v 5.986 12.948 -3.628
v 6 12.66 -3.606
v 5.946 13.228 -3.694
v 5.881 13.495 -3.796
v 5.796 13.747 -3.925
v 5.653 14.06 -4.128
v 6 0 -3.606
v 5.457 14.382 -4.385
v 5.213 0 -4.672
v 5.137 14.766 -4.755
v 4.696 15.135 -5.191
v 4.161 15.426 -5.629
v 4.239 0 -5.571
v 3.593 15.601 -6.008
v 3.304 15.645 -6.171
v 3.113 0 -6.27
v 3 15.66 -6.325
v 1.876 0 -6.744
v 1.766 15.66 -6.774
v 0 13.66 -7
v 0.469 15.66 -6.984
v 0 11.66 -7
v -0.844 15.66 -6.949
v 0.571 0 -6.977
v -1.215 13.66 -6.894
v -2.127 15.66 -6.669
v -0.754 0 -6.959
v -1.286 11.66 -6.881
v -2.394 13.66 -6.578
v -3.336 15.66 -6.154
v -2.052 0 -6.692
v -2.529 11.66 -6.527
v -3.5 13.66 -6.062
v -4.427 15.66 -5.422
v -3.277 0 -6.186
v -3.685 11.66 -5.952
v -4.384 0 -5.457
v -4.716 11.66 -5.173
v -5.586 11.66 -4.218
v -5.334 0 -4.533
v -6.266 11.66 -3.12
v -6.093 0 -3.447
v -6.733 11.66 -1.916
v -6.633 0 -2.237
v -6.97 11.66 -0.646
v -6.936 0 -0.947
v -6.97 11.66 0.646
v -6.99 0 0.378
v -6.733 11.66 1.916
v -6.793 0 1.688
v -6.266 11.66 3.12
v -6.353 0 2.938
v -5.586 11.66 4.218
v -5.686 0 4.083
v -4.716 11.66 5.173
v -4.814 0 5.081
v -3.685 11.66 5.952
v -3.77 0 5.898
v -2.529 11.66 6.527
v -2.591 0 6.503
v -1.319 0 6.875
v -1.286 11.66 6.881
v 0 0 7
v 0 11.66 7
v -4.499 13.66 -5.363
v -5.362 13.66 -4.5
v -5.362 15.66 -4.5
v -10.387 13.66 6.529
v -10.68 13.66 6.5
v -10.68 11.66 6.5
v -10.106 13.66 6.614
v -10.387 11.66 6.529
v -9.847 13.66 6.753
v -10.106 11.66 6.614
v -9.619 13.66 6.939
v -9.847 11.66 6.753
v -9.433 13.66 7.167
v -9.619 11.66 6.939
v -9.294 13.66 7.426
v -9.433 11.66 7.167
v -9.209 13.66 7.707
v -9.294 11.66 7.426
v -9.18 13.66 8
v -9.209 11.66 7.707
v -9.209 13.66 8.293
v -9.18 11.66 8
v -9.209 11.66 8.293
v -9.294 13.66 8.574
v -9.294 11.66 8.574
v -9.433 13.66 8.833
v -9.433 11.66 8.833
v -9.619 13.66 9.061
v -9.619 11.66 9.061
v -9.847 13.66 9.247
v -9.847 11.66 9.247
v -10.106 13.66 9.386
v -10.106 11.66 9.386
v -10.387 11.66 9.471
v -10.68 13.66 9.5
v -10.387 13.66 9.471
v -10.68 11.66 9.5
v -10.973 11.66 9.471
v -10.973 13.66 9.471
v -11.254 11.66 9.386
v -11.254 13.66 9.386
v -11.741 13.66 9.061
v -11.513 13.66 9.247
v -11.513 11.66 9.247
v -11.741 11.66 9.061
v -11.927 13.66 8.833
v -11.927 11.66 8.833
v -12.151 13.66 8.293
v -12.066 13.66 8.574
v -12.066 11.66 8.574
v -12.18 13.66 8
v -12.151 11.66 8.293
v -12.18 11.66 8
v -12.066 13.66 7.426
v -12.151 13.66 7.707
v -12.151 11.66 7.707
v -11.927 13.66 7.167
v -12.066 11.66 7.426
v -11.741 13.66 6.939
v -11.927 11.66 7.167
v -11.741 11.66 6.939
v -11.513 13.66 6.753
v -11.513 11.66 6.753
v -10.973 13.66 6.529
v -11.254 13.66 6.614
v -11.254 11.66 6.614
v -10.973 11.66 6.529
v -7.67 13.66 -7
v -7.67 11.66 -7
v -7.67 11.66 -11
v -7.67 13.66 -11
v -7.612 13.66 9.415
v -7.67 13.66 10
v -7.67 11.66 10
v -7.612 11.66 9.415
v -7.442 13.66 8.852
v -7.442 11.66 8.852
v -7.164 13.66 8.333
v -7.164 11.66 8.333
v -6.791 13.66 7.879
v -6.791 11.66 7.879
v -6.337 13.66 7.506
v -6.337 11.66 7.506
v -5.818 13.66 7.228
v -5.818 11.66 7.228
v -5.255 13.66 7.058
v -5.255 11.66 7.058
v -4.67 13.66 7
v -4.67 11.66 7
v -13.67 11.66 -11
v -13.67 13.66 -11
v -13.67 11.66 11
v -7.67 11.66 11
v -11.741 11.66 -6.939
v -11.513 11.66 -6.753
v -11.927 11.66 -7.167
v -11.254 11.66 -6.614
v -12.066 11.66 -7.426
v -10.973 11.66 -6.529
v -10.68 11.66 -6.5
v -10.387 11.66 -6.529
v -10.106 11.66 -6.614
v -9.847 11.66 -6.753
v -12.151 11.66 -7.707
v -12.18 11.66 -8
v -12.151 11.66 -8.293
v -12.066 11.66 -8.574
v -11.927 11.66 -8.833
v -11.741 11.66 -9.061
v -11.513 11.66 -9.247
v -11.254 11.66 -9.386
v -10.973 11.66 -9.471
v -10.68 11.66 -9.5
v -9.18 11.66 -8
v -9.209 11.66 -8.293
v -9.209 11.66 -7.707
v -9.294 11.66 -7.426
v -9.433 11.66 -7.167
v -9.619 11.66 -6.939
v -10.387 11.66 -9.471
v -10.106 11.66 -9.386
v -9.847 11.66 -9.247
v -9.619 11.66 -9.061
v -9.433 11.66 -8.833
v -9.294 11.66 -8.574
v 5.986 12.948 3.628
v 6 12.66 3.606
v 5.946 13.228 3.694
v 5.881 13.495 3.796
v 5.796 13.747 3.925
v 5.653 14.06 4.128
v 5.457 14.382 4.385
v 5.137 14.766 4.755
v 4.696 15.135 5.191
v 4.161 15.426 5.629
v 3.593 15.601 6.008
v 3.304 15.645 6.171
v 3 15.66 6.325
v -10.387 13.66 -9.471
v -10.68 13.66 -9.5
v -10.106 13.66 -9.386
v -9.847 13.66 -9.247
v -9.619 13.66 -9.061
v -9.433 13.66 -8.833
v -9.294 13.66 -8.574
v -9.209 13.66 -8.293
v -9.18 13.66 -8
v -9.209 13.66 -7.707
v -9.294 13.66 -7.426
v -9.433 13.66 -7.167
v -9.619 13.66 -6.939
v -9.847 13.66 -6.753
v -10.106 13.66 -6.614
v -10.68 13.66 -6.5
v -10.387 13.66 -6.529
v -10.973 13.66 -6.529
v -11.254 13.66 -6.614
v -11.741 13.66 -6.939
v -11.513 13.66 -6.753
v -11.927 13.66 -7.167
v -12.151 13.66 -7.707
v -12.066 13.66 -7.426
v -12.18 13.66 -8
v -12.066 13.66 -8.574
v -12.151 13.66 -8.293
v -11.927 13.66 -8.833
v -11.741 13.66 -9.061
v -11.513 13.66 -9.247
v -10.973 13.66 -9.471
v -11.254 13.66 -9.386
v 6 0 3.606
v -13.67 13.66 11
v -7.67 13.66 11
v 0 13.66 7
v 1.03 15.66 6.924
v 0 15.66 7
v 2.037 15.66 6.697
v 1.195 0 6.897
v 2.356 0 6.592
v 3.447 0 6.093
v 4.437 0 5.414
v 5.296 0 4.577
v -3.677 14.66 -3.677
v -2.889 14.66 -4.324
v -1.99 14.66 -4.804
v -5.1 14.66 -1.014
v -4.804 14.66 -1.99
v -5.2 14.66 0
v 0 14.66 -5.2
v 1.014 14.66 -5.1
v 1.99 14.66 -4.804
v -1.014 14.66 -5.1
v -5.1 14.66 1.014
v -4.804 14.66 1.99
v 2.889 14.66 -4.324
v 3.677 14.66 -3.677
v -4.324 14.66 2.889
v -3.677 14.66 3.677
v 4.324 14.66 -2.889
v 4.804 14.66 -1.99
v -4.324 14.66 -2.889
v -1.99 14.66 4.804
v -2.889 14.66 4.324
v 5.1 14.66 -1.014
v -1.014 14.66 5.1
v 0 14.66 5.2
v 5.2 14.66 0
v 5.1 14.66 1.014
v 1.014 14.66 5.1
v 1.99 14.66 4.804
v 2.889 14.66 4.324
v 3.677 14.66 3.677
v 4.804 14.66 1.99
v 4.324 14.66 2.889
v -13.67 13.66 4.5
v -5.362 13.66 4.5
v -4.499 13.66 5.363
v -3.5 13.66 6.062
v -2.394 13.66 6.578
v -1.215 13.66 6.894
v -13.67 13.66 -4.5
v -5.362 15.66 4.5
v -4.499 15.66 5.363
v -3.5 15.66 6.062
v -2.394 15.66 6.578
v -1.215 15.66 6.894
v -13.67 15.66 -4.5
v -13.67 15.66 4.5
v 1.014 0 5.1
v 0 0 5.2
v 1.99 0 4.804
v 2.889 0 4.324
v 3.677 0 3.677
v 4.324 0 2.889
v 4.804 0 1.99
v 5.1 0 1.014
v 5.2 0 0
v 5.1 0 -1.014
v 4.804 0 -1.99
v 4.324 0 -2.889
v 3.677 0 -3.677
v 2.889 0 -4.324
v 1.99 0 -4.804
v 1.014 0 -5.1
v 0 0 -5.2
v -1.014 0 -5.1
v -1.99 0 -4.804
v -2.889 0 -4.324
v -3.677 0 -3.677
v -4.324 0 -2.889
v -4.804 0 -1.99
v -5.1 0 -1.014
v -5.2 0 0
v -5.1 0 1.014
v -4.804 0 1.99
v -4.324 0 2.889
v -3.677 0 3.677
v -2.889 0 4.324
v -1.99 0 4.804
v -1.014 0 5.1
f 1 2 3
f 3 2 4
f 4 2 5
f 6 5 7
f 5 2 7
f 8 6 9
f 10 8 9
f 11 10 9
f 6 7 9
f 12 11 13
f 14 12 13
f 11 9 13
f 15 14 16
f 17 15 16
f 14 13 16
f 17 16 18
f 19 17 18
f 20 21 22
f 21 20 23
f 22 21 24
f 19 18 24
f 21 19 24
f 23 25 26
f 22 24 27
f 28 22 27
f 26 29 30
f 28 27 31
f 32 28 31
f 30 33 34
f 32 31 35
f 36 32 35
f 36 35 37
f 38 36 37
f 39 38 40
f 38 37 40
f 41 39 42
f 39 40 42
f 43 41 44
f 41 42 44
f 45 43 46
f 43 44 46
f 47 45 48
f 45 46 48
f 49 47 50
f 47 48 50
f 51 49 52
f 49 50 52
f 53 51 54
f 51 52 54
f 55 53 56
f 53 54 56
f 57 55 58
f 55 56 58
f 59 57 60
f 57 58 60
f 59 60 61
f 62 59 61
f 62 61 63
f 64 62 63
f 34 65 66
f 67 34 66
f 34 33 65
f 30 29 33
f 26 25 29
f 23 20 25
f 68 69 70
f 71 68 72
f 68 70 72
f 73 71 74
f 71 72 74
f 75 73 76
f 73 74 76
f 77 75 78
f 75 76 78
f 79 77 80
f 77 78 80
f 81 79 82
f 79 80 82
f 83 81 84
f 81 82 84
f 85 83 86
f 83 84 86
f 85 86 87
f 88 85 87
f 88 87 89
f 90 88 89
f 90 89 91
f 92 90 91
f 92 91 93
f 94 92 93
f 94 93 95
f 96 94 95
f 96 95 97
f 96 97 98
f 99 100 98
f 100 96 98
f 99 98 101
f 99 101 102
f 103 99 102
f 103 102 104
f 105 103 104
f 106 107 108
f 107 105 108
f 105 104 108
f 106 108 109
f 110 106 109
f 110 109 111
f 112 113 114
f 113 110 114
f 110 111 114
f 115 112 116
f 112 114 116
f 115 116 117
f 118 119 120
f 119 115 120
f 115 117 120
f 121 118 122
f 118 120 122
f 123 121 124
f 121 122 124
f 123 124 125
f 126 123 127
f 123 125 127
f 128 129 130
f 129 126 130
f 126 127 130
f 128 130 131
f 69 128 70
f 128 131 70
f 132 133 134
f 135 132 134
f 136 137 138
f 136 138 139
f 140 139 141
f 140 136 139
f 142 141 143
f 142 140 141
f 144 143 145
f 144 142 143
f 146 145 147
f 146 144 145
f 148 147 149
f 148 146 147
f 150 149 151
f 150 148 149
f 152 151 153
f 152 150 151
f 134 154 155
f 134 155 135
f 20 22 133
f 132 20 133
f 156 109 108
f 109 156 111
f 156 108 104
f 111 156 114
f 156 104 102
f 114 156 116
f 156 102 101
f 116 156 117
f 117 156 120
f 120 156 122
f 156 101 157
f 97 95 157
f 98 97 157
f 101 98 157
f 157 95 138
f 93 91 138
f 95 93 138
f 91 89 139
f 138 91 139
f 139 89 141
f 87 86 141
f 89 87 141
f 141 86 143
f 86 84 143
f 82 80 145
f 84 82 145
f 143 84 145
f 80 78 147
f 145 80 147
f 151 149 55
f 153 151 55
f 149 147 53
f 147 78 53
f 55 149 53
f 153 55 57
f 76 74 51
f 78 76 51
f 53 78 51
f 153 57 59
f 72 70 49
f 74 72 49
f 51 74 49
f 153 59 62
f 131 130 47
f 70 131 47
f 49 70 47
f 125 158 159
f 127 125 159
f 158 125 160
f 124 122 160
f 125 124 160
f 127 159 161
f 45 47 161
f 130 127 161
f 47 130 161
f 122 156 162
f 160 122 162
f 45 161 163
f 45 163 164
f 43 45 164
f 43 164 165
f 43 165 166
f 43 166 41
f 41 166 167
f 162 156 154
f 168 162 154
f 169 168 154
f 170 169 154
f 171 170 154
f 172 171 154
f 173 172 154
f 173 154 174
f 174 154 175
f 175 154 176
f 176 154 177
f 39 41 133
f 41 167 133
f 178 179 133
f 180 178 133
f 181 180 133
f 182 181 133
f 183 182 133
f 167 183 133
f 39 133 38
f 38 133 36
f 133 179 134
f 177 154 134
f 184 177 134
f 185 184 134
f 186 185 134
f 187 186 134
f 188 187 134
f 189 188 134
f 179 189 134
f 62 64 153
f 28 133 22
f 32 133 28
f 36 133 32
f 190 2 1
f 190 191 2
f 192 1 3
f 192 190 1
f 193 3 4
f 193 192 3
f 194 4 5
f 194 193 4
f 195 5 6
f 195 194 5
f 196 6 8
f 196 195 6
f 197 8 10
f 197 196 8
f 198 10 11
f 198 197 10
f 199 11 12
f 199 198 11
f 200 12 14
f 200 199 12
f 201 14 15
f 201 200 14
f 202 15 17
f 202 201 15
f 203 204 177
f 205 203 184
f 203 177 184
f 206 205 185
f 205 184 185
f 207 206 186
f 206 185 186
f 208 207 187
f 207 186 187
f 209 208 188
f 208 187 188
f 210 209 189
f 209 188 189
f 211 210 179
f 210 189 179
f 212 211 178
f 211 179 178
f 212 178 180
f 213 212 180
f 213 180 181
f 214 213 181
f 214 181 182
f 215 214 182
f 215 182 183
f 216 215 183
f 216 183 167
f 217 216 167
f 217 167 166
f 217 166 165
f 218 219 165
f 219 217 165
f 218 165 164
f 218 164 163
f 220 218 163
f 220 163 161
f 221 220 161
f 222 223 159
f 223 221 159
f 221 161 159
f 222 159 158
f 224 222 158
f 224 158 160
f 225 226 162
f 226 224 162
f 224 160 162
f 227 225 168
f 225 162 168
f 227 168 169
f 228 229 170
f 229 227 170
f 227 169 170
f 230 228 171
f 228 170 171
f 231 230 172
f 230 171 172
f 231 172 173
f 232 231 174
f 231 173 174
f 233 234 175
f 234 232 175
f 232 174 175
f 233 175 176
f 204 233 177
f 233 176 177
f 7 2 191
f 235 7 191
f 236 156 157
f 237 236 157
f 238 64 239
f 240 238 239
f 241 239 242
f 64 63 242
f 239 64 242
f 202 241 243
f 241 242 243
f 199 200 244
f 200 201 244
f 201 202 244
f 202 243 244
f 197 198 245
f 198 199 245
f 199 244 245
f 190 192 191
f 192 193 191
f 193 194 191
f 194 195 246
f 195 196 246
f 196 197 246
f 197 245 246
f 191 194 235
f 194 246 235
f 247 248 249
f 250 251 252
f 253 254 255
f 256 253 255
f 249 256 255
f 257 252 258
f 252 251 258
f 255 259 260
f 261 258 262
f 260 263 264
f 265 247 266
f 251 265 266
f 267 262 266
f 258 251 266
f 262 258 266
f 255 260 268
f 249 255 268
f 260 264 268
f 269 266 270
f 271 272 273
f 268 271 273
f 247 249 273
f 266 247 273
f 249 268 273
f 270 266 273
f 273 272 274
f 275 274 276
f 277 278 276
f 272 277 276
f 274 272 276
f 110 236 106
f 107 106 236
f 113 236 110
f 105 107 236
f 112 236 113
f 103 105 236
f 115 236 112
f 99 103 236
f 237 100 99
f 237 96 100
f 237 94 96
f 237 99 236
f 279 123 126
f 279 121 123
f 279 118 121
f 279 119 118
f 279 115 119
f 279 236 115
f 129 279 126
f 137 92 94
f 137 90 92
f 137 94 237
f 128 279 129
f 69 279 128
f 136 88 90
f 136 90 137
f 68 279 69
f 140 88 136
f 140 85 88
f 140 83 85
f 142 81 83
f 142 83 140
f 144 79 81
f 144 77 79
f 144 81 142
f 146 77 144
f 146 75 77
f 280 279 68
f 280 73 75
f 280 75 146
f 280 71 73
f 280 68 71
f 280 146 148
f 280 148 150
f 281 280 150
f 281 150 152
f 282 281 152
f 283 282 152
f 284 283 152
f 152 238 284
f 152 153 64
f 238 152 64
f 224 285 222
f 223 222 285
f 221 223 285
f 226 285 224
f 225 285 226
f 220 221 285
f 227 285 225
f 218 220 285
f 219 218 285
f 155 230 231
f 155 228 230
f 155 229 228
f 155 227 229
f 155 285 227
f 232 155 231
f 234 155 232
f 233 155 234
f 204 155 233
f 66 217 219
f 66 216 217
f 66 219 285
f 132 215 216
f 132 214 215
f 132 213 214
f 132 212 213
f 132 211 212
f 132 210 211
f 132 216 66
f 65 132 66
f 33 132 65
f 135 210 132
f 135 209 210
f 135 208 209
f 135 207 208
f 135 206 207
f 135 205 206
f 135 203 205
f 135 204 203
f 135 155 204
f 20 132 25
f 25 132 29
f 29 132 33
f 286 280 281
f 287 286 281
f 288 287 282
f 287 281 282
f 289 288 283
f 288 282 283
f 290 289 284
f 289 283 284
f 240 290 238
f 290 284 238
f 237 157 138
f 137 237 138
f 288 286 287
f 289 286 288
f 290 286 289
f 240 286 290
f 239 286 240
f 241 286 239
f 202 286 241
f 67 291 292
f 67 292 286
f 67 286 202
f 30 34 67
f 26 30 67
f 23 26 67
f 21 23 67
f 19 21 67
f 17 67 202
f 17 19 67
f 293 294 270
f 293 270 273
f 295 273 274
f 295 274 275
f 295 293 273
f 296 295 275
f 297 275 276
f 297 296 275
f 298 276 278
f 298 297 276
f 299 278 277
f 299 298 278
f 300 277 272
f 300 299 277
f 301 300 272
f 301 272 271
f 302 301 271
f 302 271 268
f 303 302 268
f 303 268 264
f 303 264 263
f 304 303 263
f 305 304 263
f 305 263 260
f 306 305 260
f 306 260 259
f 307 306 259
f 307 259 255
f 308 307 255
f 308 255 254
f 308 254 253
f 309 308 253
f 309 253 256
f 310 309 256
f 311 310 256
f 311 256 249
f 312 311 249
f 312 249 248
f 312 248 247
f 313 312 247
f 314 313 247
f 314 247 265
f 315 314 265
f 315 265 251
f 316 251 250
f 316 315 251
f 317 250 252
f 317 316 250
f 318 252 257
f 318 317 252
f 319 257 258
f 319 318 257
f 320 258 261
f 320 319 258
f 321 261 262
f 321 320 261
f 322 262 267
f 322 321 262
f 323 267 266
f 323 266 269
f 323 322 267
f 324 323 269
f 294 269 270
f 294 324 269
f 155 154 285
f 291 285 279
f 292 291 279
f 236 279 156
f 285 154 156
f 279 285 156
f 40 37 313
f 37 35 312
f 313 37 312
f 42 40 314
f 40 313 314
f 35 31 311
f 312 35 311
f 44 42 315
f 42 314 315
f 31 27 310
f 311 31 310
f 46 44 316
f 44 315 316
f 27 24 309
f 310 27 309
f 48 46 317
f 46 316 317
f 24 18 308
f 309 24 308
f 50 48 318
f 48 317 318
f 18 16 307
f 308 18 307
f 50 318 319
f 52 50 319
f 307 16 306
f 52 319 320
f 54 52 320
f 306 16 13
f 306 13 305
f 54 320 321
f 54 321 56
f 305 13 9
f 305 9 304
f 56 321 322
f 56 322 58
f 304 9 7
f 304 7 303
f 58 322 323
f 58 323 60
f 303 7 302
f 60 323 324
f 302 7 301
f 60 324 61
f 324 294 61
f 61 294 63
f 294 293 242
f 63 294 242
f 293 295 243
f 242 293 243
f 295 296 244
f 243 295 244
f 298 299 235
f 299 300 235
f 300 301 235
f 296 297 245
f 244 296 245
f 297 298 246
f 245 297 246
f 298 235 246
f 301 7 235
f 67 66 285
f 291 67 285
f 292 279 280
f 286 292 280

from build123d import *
from build123d.topology import SkipClean

# Parameters (mm, degrees)
SKETCH1_R           = 7
SKETCH1_R_2         = 5.2
BOSS_EXTRUDE1_DEPTH = 15.66
BOSS_EXTRUDE2_START = -4
SKETCH2_W           = 6
SKETCH2_H           = 4
BOSS_EXTRUDE2_DEPTH = 4
CUT_EXTRUDE2_START  = -2
SKETCH2_3_W         = 6
SKETCH2_3_H         = 4
CUT_EXTRUDE2_DEPTH  = 2
SKETCH4_R           = 1.5
CUT_EXTRUDE1_DEPTH  = 10
FILLET7_R           = 3
BOSS_EXTRUDE3_START = -1
SKETCH5_R           = 5.2
BOSS_EXTRUDE3_DEPTH = 1
CUT_EXTRUDE3_DEPTH  = 15.66
FILLET8_R           = 3
BOSS_EXTRUDE4_DEPTH = 2


with BuildPart() as part:
    # Sketch1 → Boss-Extrude1 (new body)
    with BuildSketch(Plane(origin=(0, 0, 0), x_dir=(1, 0, 0), z_dir=(0, 1, 0))):
        with Locations(Location((0, 0, 0), (0, 0, 270))):
            Circle(SKETCH1_R)
        with Locations(Location((0, 0, 0), (0, 0, 270))):
            Circle(SKETCH1_R_2, mode=Mode.SUBTRACT)
    extrude(amount=BOSS_EXTRUDE1_DEPTH)

    # Sketch2 → Boss-Extrude2 (add)
    with BuildSketch(Plane(origin=(0, 15.66, 0), x_dir=(1, 0, 0), z_dir=(0, 1, 0)).offset(BOSS_EXTRUDE2_START)):
        with Locations((-10.67, -9)):
            Rectangle(SKETCH2_W, SKETCH2_H)
        with BuildLine():
            ThreePointArc((0, -7), (-7, 0), (0, 7))
            Line((0, 7), (-7.67, 7))
            Line((-7.67, 7), (-13.67, 7))
            Line((-13.67, 7), (-13.67, -7))
            Line((-13.67, -7), (-7.67, -7))
            Line((-7.67, -7), (0, -7))
        make_face()
        with Locations((-10.67, 9)):
            Rectangle(SKETCH2_W, SKETCH2_H)
    extrude(amount=BOSS_EXTRUDE2_DEPTH)

    # Sketch2<3> → Cut-Extrude2 (cut)
    with SkipClean():  # the faces are left unmerged after this step: merging them gives an invalid solid
        with BuildSketch(Plane(origin=(0, 15.66, 0), x_dir=(1, 0, 0), z_dir=(0, 1, 0)).offset(CUT_EXTRUDE2_START)):
            with BuildLine():
                ThreePointArc((0, -7), (-7, 0), (0, 7))
                Line((0, 7), (-7.67, 7))
                Line((-7.67, 7), (-13.67, 7))
                Line((-13.67, 7), (-13.67, -7))
                Line((-13.67, -7), (-7.67, -7))
                Line((-7.67, -7), (0, -7))
            make_face()
            with Locations((-10.67, 9)):
                Rectangle(SKETCH2_3_W, SKETCH2_3_H)
            with Locations((-10.67, -9)):
                Rectangle(SKETCH2_3_W, SKETCH2_3_H)
        extrude(amount=CUT_EXTRUDE2_DEPTH, mode=Mode.SUBTRACT)

    # Sketch4 → Cut-Extrude1 (cut)
    with SkipClean():  # the faces are left unmerged after this step: merging them gives an invalid solid
        with BuildSketch(Plane.XZ.offset(-11.66)):
            with Locations(Location((-10.68, -8, 0), (0, 0, 270))):
                Circle(SKETCH4_R)
            with Locations(Location((-10.68, 8, 0), (0, 0, 270))):
                Circle(SKETCH4_R)
        extrude(amount=-CUT_EXTRUDE1_DEPTH, mode=Mode.SUBTRACT)

    # Fillet7
    fillet7_edges = [part.edges().sort_by_distance(p)[0] for p in [
        (-7.67, 12.66, 7),
    ]]
    fillet(fillet7_edges, radius=FILLET7_R)

    # Sketch5 → Boss-Extrude3 (add)
    with SkipClean():  # the faces are left unmerged after this step: merging them gives an invalid solid
        with BuildSketch(Plane(origin=(0, 15.66, 0), x_dir=(1, 0, 0), z_dir=(0, 1, 0)).offset(BOSS_EXTRUDE3_START)):
            with Locations(Location((0, 0, 0), (0, 0, 270))):
                Circle(SKETCH5_R)
        extrude(amount=BOSS_EXTRUDE3_DEPTH)

    # Sketch6 → Cut-Extrude3 (cut)
    with BuildSketch(Plane.XZ):
        with BuildLine():
            Line((6, -3.605551275), (6, 3.605551275))
            ThreePointArc((6, 3.605551275), (7, 0), (6, -3.605551275))
        make_face()
    extrude(amount=-CUT_EXTRUDE3_DEPTH, mode=Mode.SUBTRACT)

    # Fillet8
    fillet8_edges = [part.edges().sort_by_distance(p)[0] for p in [
        (6, 15.66, 0),
    ]]
    fillet(fillet8_edges, radius=FILLET8_R)

    # Sketch7 → Boss-Extrude4 (add)
    with BuildSketch(Plane(origin=(0, 13.66, 0), x_dir=(1, 0, 0), z_dir=(0, 1, 0))):
        with BuildLine():
            Line((-13.67, 4.5), (-13.67, -4.5))
            Line((-13.67, -4.5), (-5.361902647, -4.5))
            ThreePointArc((-5.361902647, -4.5), (-7, 0), (-5.361902647, 4.5))
            Line((-5.361902647, 4.5), (-13.67, 4.5))
        make_face()
    extrude(amount=BOSS_EXTRUDE4_DEPTH)


solid = part.part
